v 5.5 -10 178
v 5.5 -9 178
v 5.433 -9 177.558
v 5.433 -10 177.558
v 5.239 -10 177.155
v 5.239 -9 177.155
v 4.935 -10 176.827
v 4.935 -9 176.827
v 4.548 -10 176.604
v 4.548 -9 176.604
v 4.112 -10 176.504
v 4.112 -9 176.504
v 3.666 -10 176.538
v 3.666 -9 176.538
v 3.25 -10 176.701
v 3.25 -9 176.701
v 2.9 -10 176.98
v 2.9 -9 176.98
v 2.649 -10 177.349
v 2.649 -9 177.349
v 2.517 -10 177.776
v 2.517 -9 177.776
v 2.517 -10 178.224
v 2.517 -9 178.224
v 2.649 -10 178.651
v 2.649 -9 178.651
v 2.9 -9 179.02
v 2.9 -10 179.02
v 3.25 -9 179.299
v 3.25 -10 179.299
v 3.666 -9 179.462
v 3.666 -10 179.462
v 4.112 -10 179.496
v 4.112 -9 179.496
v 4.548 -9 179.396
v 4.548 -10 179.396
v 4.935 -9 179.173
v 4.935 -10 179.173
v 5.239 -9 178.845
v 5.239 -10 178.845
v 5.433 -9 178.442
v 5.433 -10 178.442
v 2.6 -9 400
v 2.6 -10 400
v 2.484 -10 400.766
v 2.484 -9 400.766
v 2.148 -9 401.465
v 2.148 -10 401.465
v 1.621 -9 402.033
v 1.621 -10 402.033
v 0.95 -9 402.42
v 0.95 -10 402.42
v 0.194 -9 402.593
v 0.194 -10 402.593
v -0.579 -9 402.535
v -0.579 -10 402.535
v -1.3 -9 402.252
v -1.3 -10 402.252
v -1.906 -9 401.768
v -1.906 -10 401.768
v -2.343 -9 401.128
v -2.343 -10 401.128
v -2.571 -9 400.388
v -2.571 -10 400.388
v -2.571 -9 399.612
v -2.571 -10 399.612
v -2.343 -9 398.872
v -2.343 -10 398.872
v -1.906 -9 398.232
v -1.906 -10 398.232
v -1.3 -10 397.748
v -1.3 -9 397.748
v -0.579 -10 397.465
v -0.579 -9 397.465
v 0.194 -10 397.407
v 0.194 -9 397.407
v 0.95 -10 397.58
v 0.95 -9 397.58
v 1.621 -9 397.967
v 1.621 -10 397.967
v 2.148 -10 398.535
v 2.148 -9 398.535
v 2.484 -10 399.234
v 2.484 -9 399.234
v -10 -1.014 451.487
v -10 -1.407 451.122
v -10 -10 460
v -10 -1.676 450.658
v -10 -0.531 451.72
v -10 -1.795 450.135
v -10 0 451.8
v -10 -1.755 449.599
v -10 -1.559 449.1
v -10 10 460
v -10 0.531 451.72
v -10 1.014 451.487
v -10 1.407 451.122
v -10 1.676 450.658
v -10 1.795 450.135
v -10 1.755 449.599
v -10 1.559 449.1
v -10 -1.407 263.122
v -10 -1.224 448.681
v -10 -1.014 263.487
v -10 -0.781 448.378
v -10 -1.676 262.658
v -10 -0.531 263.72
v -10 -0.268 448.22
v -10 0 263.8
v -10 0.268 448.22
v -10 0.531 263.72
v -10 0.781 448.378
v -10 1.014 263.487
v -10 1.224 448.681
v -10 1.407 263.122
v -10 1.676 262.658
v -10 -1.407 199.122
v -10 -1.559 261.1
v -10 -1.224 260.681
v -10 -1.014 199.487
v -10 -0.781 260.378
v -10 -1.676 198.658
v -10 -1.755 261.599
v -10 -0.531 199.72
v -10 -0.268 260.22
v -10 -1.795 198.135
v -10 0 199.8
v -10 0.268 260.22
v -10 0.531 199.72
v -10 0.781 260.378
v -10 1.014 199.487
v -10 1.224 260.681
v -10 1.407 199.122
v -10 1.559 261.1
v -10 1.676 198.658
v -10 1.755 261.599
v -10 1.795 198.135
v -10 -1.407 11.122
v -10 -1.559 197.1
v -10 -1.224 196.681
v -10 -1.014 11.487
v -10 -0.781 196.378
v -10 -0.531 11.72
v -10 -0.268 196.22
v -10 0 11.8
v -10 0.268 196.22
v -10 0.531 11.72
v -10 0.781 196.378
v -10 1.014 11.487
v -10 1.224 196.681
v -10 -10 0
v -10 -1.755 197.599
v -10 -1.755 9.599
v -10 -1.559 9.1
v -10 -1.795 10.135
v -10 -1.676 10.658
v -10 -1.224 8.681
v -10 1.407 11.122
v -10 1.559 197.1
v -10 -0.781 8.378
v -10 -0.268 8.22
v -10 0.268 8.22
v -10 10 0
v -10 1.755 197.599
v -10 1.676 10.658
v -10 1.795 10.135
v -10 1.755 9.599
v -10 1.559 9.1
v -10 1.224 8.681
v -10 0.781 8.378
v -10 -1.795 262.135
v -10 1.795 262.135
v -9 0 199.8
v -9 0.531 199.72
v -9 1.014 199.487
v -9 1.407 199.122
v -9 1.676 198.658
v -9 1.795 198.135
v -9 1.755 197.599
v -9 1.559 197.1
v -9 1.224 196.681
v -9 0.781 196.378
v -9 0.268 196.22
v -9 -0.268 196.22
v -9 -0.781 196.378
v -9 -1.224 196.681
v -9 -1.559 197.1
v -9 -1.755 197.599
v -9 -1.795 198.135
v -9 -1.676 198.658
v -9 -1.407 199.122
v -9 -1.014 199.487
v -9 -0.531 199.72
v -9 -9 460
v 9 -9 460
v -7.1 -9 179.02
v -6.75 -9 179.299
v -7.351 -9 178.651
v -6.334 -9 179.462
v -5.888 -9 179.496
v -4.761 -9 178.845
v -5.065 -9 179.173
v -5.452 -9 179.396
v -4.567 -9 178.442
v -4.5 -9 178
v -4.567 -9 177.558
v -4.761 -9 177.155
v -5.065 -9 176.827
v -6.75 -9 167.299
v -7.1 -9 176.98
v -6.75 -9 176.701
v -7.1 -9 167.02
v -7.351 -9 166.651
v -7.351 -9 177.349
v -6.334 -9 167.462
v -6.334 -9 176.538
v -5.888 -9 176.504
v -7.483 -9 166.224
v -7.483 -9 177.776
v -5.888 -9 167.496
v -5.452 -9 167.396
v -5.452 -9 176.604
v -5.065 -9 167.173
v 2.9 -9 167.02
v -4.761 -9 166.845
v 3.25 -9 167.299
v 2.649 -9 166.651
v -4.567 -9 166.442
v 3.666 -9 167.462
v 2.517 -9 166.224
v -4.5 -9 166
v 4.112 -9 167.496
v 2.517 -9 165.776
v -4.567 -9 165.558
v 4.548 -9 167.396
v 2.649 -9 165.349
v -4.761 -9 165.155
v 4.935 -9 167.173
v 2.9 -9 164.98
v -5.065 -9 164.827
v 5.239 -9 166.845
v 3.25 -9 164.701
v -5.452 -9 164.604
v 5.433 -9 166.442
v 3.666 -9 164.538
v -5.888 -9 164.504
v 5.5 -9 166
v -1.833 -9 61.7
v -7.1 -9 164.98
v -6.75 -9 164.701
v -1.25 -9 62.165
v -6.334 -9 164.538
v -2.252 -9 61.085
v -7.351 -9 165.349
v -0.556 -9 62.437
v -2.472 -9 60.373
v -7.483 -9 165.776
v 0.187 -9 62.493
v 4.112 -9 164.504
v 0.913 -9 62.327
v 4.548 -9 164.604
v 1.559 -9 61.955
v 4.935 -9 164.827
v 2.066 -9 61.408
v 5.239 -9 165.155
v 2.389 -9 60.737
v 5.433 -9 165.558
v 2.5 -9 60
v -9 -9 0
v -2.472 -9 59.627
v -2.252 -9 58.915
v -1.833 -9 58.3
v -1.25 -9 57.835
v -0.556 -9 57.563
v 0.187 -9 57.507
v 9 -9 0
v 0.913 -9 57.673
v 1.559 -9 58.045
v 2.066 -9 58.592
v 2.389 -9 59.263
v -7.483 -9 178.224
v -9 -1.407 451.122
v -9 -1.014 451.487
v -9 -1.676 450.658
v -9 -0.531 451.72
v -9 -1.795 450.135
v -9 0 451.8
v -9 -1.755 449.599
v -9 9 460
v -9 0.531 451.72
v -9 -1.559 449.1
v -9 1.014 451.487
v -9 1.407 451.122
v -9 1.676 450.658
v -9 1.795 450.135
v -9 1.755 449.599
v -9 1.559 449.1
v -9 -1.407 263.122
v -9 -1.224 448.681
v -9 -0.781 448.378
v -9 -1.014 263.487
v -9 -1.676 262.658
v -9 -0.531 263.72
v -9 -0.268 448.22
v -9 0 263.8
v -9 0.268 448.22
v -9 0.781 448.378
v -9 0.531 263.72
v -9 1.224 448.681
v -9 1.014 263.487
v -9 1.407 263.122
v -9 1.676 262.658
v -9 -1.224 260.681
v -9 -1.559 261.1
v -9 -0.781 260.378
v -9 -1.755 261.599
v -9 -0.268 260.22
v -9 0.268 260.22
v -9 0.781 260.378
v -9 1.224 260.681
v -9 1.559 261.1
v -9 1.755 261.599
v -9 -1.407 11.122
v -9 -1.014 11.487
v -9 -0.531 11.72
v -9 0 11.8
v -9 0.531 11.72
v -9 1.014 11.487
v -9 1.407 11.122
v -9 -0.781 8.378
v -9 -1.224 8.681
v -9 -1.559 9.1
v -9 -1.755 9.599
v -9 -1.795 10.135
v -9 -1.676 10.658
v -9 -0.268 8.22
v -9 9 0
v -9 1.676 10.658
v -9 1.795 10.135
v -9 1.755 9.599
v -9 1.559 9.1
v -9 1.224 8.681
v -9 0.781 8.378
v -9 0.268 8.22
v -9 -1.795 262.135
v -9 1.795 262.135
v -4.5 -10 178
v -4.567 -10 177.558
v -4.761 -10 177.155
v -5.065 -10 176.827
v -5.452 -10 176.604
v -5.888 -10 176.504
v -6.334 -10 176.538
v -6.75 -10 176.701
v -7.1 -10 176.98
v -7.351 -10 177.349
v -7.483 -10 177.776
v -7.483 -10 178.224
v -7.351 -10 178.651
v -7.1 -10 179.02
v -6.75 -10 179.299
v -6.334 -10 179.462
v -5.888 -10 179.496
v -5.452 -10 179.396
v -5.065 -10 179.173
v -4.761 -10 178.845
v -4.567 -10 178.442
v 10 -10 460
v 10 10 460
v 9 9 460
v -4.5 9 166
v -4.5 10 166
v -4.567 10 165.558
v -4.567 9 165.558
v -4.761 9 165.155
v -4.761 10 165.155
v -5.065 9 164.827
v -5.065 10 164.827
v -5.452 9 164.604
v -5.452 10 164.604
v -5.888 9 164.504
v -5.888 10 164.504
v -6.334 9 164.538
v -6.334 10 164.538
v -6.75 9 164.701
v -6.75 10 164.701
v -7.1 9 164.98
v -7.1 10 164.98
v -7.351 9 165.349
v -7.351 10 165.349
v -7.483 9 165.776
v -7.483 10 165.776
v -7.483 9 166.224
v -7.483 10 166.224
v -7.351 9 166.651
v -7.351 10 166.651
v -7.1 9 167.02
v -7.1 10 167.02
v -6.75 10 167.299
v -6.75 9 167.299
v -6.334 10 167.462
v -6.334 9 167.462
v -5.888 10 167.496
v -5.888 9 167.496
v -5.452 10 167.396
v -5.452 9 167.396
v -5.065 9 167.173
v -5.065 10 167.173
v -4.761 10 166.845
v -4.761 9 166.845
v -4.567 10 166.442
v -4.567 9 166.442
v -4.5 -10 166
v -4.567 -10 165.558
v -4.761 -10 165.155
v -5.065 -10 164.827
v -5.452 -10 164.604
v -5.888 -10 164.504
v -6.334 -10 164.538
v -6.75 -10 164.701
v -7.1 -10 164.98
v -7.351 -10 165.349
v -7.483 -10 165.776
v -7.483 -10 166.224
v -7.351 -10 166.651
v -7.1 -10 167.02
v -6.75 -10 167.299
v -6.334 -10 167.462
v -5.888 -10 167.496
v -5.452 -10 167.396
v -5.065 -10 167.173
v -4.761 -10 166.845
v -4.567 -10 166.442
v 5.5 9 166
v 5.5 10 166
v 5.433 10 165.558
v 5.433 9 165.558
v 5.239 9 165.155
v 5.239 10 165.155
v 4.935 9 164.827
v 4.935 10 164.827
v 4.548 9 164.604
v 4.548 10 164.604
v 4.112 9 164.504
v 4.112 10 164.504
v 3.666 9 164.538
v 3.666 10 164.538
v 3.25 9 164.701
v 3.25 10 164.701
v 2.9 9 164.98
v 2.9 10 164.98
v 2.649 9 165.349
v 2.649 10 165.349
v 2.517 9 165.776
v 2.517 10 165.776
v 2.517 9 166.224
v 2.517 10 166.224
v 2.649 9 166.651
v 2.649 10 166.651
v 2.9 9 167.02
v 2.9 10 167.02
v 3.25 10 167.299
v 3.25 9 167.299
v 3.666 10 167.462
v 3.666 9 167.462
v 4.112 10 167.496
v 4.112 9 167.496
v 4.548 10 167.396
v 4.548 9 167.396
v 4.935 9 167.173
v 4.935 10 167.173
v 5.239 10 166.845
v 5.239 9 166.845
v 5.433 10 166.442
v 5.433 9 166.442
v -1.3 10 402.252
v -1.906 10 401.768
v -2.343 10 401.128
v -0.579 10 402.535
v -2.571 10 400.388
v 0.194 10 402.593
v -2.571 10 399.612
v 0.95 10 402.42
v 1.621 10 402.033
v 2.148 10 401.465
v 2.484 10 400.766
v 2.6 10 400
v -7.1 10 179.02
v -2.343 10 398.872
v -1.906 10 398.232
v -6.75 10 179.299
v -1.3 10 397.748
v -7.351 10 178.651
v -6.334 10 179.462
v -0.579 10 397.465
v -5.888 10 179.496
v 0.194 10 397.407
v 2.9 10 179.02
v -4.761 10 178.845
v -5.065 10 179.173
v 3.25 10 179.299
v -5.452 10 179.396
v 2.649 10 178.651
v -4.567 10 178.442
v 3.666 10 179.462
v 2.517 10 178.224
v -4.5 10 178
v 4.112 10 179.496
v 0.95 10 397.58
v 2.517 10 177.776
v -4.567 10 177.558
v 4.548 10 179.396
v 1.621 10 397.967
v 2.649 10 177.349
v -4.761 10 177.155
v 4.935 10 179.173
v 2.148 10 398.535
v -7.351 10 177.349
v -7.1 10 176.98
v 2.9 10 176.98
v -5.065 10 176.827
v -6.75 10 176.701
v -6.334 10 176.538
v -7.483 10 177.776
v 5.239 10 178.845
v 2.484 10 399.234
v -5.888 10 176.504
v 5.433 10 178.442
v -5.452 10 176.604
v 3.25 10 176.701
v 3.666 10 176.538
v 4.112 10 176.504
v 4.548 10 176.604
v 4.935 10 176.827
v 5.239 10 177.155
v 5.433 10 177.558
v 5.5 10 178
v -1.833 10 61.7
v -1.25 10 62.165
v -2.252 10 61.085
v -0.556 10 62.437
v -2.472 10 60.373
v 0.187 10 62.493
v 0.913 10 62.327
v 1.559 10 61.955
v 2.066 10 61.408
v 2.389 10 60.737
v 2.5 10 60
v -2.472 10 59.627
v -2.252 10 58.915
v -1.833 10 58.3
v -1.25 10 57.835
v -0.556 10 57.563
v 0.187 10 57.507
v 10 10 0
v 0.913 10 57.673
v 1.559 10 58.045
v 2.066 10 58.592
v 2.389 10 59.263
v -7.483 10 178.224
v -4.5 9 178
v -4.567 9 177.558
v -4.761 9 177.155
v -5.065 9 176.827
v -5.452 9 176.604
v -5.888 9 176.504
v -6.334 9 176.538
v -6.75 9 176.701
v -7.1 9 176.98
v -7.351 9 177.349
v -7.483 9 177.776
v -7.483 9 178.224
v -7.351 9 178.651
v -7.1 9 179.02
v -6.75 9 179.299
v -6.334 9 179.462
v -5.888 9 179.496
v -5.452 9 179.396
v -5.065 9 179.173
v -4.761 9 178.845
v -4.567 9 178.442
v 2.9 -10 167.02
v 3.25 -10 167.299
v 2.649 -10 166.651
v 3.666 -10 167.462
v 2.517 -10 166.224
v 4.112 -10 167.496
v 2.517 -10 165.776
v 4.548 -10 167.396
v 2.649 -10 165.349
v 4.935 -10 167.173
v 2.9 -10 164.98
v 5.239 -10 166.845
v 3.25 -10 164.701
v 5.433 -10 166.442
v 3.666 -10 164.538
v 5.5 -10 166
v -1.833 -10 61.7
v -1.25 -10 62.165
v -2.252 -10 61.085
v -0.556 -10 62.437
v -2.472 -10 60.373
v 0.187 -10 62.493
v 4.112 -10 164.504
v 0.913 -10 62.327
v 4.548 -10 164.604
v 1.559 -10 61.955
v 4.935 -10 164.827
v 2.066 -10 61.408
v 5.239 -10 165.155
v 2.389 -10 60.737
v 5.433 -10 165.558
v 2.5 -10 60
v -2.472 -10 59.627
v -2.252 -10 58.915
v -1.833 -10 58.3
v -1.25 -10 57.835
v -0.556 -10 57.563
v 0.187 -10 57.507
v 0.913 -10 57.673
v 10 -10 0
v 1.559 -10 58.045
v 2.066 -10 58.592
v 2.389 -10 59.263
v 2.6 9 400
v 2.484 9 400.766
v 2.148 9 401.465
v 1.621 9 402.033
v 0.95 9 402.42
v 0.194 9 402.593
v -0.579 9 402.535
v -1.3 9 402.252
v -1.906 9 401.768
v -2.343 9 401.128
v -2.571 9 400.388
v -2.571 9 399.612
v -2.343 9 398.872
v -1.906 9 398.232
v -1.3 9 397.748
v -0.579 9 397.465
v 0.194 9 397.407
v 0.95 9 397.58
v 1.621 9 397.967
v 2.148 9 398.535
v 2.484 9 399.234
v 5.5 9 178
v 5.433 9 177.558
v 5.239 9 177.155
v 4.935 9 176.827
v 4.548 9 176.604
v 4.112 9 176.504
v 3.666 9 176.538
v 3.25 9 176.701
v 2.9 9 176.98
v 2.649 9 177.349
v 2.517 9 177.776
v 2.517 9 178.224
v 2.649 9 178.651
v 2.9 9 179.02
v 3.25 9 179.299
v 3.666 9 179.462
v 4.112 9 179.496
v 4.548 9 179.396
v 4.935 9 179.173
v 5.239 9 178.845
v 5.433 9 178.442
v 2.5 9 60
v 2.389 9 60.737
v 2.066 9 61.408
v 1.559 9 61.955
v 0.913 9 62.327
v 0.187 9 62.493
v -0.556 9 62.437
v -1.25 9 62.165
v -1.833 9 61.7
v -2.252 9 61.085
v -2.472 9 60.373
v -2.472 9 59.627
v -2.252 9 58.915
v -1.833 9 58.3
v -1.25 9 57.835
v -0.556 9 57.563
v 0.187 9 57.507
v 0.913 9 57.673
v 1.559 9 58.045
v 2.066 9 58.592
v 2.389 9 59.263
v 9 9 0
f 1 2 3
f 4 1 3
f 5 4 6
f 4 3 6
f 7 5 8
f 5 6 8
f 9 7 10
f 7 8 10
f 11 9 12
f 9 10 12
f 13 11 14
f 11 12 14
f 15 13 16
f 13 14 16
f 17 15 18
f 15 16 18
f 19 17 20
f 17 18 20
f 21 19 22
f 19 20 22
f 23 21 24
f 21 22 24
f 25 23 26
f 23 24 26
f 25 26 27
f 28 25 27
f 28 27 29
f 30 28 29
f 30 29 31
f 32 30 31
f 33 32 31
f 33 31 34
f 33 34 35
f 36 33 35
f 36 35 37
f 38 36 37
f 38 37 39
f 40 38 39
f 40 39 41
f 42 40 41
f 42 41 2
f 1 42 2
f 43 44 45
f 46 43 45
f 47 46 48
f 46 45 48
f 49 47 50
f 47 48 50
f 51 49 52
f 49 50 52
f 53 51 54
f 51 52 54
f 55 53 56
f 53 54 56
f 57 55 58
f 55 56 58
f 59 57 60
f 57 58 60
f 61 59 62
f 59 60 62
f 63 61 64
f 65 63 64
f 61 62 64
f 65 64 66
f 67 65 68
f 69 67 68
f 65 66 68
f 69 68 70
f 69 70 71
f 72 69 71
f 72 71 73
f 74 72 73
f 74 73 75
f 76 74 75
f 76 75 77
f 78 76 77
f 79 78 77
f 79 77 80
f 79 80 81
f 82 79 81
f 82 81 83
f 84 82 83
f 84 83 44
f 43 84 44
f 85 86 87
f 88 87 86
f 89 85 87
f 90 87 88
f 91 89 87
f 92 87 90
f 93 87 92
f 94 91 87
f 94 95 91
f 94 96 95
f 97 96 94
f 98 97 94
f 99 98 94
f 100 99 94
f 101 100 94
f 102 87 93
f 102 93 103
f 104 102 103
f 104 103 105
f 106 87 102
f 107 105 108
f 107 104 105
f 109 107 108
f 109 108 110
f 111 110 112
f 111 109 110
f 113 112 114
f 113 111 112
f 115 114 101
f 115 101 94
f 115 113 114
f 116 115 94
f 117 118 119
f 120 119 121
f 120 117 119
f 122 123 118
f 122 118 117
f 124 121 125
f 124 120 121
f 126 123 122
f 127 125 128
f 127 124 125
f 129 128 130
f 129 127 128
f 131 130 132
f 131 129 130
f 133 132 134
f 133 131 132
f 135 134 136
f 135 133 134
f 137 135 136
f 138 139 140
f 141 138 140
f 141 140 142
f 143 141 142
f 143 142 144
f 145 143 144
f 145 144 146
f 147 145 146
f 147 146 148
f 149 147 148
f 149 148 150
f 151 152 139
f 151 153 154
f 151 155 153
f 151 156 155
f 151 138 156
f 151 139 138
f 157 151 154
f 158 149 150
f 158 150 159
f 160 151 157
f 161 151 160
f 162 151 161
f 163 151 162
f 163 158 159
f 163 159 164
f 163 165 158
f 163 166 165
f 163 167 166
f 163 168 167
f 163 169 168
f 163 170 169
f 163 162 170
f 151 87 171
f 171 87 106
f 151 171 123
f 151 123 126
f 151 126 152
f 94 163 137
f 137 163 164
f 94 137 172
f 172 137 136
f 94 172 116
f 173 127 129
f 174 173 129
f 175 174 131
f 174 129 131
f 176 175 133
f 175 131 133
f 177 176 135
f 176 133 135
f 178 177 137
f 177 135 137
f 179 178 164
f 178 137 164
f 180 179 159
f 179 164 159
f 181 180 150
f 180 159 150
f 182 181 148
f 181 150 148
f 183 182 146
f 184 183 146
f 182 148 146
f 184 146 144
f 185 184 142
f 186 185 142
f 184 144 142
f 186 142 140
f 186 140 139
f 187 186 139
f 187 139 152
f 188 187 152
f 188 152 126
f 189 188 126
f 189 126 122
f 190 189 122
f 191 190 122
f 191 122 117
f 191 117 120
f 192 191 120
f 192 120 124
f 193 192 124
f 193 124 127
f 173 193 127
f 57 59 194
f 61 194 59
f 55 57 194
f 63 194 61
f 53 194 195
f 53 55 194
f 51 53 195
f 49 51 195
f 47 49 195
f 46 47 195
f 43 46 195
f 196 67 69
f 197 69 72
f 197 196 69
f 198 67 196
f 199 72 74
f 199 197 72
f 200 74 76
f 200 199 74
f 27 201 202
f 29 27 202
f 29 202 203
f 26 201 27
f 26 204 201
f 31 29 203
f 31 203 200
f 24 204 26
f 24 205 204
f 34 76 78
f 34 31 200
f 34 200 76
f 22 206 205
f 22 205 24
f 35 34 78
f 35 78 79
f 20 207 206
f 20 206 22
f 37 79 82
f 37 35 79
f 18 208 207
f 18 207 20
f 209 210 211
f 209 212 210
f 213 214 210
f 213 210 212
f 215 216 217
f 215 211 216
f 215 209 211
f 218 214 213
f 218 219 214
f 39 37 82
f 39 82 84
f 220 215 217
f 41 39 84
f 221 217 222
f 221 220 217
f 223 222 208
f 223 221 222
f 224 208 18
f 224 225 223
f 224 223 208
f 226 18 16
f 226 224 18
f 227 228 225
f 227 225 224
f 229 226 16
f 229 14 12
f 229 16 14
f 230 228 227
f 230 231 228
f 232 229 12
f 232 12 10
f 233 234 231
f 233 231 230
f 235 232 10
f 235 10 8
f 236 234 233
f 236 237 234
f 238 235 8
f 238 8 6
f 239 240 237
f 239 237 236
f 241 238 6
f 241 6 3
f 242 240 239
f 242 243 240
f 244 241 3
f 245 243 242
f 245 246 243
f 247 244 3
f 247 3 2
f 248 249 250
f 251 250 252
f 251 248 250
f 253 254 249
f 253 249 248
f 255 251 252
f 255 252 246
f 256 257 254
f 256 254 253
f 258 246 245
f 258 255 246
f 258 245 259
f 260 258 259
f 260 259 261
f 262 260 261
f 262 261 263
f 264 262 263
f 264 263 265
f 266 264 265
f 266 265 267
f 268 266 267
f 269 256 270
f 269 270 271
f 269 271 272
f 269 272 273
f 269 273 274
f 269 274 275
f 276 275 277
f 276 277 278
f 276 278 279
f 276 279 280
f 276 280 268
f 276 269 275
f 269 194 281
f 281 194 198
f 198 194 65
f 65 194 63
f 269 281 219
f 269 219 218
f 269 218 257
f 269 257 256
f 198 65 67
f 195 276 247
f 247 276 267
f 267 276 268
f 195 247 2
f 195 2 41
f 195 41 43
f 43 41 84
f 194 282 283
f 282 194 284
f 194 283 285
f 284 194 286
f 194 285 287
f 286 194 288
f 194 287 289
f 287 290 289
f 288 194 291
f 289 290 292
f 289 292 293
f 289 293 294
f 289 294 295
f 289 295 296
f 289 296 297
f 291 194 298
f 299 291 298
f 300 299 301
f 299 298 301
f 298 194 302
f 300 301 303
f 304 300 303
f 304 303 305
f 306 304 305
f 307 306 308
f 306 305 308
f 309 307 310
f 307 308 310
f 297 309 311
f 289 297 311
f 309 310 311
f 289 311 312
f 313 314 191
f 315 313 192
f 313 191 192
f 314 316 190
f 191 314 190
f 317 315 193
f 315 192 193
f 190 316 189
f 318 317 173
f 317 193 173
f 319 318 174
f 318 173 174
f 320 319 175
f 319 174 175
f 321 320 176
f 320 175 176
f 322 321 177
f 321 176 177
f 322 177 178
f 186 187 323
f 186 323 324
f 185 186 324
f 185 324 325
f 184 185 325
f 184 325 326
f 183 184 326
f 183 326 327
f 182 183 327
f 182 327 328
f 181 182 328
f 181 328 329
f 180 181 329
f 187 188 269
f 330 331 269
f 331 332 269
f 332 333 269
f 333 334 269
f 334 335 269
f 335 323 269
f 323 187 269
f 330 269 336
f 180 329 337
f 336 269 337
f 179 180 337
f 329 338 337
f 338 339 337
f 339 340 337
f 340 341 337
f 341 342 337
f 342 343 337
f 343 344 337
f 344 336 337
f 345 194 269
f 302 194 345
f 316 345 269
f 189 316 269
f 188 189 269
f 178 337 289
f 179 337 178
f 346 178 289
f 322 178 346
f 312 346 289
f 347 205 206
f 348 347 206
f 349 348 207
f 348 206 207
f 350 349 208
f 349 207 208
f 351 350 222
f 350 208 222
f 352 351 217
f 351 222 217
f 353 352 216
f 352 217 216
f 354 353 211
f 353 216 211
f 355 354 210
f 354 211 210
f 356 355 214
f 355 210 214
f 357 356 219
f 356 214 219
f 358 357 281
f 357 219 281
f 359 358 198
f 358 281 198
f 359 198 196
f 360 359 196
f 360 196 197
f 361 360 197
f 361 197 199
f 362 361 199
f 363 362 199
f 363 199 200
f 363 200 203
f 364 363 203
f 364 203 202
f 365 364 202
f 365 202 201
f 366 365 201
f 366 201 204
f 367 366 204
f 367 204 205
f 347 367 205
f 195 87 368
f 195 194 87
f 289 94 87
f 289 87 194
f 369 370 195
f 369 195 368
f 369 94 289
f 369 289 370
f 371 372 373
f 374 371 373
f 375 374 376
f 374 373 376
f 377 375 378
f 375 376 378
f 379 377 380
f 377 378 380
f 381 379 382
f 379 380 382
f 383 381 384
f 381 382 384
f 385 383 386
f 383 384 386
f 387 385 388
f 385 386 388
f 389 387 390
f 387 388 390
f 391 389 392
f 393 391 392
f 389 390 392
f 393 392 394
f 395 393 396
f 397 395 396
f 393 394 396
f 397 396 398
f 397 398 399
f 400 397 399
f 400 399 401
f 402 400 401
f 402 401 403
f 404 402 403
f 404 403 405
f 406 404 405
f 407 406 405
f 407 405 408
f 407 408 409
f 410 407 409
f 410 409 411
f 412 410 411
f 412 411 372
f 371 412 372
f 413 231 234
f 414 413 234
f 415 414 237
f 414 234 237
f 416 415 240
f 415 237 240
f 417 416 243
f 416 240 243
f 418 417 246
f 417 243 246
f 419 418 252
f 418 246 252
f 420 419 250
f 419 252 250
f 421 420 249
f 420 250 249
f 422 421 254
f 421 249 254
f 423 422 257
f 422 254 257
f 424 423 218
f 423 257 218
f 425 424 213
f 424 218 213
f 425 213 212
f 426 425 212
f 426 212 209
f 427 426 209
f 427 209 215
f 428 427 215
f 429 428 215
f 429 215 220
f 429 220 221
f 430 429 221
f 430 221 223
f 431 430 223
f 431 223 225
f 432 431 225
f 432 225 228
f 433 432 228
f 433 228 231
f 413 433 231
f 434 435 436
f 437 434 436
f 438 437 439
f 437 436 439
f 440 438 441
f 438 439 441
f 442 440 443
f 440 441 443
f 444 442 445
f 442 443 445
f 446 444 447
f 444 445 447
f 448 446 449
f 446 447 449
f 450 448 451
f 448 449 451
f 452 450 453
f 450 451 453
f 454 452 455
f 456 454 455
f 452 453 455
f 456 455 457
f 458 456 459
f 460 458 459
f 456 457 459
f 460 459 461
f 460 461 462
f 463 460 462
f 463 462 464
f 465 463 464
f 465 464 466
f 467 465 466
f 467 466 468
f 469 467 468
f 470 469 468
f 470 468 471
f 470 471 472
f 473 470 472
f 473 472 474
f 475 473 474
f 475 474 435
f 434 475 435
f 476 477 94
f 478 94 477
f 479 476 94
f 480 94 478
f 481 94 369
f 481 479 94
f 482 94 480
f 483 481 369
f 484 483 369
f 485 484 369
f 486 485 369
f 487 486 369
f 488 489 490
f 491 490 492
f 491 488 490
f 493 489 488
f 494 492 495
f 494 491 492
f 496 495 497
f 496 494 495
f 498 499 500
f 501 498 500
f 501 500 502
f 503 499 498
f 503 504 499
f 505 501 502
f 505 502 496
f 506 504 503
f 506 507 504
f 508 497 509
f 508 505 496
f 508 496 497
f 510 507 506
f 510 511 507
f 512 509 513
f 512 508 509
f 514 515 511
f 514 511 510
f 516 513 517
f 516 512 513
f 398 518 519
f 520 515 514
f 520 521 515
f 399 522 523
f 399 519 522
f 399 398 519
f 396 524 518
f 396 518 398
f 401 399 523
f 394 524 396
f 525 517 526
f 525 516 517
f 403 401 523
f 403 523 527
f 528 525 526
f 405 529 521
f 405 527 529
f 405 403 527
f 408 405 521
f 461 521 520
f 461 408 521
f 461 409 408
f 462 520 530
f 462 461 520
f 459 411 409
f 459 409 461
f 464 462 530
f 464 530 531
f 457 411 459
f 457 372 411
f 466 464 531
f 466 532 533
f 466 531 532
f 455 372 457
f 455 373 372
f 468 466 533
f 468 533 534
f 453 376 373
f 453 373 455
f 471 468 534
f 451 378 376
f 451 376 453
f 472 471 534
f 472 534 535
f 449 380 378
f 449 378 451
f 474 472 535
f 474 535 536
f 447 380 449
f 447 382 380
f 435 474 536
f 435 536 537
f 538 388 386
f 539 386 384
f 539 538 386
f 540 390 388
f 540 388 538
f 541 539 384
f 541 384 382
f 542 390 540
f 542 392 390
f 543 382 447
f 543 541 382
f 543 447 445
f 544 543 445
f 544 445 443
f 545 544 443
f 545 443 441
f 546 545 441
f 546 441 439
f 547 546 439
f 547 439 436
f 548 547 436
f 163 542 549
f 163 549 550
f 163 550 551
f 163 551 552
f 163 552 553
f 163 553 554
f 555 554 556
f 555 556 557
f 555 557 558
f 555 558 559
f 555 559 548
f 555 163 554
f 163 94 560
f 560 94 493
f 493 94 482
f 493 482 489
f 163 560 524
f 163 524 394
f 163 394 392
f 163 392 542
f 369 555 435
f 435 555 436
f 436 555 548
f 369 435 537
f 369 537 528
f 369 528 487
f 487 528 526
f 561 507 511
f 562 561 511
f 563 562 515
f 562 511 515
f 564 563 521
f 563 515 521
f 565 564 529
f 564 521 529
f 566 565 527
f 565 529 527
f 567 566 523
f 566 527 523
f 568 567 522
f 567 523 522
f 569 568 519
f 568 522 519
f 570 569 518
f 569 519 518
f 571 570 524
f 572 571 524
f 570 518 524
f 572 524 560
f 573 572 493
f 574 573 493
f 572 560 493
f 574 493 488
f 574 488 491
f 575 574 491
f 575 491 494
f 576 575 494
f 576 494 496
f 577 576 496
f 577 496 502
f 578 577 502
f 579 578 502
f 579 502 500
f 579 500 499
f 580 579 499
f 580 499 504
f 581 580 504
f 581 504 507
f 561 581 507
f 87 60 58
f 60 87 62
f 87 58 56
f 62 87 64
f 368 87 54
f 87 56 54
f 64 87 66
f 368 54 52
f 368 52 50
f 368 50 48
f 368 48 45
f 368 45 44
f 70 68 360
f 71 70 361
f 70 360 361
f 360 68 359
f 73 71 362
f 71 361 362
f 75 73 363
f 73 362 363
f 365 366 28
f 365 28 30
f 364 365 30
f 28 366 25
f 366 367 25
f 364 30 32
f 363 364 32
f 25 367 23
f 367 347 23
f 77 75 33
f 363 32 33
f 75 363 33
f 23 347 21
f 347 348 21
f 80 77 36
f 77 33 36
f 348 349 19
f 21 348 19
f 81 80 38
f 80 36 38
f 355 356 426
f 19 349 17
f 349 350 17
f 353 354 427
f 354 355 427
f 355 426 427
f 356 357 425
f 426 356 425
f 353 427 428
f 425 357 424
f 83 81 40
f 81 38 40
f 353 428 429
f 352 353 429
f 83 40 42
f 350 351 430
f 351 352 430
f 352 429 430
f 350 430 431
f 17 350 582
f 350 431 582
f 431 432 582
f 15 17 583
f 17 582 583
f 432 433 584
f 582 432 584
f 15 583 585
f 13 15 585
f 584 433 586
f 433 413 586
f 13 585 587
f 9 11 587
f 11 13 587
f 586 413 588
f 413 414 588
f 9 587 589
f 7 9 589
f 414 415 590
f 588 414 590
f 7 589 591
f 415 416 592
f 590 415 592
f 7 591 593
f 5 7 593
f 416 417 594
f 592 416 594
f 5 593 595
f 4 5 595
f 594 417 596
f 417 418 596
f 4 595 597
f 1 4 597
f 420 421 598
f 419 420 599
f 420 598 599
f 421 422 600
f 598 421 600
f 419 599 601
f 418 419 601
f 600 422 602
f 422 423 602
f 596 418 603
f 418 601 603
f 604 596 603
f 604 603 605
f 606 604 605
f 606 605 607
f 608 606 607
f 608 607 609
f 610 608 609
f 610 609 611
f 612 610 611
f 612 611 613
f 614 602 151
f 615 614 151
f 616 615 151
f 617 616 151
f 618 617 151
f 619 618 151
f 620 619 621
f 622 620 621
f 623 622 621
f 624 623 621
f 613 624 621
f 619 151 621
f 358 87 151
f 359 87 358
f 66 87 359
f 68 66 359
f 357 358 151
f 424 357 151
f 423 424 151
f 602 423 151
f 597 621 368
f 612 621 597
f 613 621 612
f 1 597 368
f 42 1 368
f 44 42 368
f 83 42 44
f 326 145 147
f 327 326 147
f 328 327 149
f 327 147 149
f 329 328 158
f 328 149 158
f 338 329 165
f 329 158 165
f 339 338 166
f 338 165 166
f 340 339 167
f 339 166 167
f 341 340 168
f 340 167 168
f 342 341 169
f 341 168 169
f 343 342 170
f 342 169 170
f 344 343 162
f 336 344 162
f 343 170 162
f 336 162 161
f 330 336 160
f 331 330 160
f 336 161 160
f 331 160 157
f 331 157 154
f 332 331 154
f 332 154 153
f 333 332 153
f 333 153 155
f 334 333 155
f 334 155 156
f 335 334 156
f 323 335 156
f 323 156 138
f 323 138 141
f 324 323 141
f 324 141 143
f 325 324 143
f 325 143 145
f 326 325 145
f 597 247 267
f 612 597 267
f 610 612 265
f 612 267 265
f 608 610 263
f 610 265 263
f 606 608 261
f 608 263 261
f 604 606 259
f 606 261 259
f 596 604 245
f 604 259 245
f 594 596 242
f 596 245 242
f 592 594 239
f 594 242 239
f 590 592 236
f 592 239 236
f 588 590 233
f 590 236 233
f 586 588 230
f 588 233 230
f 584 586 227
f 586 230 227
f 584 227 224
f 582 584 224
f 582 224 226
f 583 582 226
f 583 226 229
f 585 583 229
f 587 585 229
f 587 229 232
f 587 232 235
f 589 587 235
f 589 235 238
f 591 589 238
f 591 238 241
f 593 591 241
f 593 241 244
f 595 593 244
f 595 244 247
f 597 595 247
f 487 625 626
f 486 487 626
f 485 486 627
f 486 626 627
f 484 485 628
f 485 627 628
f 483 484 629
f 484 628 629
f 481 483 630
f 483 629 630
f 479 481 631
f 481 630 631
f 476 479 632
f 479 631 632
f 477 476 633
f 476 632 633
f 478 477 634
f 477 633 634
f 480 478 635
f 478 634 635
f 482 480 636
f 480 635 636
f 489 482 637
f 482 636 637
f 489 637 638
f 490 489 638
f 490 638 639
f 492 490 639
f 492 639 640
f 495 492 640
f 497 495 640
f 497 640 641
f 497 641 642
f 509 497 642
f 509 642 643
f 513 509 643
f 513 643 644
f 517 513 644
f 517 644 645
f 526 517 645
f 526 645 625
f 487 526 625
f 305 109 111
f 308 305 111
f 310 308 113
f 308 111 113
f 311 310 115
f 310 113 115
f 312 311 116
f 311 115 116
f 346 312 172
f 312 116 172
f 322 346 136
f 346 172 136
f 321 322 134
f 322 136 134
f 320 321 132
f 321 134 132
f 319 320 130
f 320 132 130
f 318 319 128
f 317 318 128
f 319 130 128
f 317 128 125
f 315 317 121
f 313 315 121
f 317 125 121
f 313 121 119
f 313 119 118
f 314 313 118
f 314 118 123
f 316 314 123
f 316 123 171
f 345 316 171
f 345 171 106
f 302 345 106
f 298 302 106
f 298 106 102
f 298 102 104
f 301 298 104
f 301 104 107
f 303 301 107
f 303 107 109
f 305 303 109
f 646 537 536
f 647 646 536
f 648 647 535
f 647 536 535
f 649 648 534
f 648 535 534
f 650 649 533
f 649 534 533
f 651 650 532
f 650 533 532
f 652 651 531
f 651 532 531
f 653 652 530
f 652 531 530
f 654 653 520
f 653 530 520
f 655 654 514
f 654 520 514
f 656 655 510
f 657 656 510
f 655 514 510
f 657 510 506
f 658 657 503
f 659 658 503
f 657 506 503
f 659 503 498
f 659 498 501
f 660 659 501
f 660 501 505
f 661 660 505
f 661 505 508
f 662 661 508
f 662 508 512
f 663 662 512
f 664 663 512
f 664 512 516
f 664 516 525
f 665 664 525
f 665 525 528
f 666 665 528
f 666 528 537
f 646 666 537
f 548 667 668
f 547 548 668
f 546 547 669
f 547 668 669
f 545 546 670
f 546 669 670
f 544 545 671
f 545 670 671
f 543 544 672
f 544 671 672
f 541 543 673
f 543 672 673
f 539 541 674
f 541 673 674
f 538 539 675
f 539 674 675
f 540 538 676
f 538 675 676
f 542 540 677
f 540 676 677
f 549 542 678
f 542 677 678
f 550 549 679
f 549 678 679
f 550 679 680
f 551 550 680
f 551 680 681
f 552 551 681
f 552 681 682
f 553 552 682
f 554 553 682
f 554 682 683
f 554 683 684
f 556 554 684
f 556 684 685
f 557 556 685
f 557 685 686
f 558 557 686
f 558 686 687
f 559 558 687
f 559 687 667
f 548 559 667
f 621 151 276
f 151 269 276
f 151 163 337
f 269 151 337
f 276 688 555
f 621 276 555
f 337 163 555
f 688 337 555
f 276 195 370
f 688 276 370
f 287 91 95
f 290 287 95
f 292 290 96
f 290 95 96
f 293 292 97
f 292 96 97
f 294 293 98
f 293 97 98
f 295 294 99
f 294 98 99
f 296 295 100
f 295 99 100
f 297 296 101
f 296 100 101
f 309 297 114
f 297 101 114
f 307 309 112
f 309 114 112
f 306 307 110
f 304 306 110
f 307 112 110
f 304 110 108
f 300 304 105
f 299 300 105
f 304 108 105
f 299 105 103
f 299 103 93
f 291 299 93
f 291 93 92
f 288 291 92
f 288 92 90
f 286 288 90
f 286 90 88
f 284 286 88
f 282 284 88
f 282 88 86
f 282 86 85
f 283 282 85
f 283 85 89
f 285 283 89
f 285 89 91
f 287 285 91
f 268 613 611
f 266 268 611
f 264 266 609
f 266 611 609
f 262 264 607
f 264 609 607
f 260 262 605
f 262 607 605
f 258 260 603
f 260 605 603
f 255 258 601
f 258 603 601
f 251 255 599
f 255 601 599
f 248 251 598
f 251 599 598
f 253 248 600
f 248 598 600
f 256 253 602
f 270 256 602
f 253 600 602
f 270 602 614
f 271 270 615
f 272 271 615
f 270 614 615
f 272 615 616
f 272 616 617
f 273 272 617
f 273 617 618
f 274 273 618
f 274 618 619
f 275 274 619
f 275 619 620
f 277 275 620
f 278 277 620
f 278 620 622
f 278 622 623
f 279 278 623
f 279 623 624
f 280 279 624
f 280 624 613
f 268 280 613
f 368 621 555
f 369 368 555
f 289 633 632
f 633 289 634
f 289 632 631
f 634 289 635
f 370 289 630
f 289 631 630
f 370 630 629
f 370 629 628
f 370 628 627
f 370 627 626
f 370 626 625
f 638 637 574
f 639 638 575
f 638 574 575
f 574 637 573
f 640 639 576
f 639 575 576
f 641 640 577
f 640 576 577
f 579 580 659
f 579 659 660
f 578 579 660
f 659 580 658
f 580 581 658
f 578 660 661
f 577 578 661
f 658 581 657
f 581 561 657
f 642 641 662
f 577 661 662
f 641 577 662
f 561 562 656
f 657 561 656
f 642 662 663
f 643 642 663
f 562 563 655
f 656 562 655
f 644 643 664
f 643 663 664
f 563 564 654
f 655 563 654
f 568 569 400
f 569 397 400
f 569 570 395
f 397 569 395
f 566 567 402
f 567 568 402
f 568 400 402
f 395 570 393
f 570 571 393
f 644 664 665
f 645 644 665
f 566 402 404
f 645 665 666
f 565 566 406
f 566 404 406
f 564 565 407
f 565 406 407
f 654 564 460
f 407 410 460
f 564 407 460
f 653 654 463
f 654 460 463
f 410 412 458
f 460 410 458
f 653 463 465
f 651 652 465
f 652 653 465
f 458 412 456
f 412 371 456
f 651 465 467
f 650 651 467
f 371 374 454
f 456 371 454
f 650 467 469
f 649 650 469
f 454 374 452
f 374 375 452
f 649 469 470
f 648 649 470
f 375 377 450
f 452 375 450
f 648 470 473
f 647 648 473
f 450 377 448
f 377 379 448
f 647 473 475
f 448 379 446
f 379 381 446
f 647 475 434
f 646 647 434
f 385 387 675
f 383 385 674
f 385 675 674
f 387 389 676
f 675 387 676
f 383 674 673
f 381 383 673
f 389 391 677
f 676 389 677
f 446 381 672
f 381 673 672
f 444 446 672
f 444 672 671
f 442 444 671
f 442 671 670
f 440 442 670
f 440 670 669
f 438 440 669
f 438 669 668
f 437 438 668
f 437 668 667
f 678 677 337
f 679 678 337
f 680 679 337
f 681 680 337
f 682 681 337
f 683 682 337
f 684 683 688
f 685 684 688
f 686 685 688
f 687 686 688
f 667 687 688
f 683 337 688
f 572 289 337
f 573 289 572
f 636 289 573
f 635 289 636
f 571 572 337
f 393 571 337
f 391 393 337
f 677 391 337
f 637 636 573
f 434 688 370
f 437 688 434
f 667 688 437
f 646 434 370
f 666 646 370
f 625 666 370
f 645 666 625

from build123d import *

# Parameters (mm, degrees)
SKETCH_1_W          = 20
SKETCH_1_H          = 20
SKETCH_1_W_2        = 18
SKETCH_1_H_2        = 18
EXTRUDE_1_DEPTH     = 460
SKETCH_2_R          = 1.8
CUT_EXTRUDE_1_DEPTH = 3
SKETCH_3_R          = 1.8
CUT_EXTRUDE_2_DEPTH = 3
SKETCH_5_R          = 1.8
CUT_EXTRUDE_3_DEPTH = 3
SKETCH_6_R          = 1.8
CUT_EXTRUDE_4_DEPTH = 10
SKETCH_7_R          = 1.5
CUT_EXTRUDE_5_DEPTH = 20
SKETCH1_R           = 2.5
CUT_EXTRUDE1_DEPTH  = 20
SKETCH2_R           = 2.6
CUT_EXTRUDE2_DEPTH  = 36


with BuildPart() as part:
    # 草图1 → 凸台-拉伸1 (new body)
    with BuildSketch(Plane.XY):
        Rectangle(SKETCH_1_W, SKETCH_1_H)
        Rectangle(SKETCH_1_W_2, SKETCH_1_H_2, mode=Mode.SUBTRACT)
    extrude(amount=EXTRUDE_1_DEPTH)

    # 草图2 → 切除-拉伸1 (cut)
    with BuildSketch(Plane.ZY.offset(10)):
        with Locations((10, 0)):
            Circle(SKETCH_2_R)
    extrude(amount=-CUT_EXTRUDE_1_DEPTH, mode=Mode.SUBTRACT)

    # 草图3 → 切除-拉伸2 (cut)
    with BuildSketch(Plane.ZY.offset(10)):
        with Locations((198, 0)):
            Circle(SKETCH_3_R)
    extrude(amount=-CUT_EXTRUDE_2_DEPTH, mode=Mode.SUBTRACT)

    # 草图5 → 切除-拉伸3 (cut)
    with BuildSketch(Plane.ZY.offset(10)):
        with Locations((450, 0)):
            Circle(SKETCH_5_R)
    extrude(amount=-CUT_EXTRUDE_3_DEPTH, mode=Mode.SUBTRACT)

    # 草图6 → 切除-拉伸4 (cut)
    with BuildSketch(Plane.ZY.offset(10)):
        with Locations((262, 0)):
            Circle(SKETCH_6_R)
    extrude(amount=-CUT_EXTRUDE_4_DEPTH, mode=Mode.SUBTRACT)

    # 草图7 → 切除-拉伸5 (cut)
    with BuildSketch(Plane(origin=(0, 10, 0), x_dir=(1, 0, 0), z_dir=(0, 1, 0))):
        with Locations((4, -166)):
            Circle(SKETCH_7_R)
        with Locations((-6, -166)):
            Circle(SKETCH_7_R)
        with Locations((4, -178)):
            Circle(SKETCH_7_R)
        with Locations((-6, -178)):
            Circle(SKETCH_7_R)
    extrude(amount=-CUT_EXTRUDE_5_DEPTH, mode=Mode.SUBTRACT)

    # Sketch1 → Cut-Extrude1 (cut)
    with BuildSketch(Plane.XZ.offset(10)):
        with Locations((0, 60)):
            Circle(SKETCH1_R)
    extrude(amount=-CUT_EXTRUDE1_DEPTH, mode=Mode.SUBTRACT)

    # Sketch2 → Cut-Extrude2 (cut)
    with BuildSketch(Plane.XZ.offset(10)):
        with Locations((0, 400)):
            Circle(SKETCH2_R)
    extrude(amount=-CUT_EXTRUDE2_DEPTH, mode=Mode.SUBTRACT)


solid = part.part
